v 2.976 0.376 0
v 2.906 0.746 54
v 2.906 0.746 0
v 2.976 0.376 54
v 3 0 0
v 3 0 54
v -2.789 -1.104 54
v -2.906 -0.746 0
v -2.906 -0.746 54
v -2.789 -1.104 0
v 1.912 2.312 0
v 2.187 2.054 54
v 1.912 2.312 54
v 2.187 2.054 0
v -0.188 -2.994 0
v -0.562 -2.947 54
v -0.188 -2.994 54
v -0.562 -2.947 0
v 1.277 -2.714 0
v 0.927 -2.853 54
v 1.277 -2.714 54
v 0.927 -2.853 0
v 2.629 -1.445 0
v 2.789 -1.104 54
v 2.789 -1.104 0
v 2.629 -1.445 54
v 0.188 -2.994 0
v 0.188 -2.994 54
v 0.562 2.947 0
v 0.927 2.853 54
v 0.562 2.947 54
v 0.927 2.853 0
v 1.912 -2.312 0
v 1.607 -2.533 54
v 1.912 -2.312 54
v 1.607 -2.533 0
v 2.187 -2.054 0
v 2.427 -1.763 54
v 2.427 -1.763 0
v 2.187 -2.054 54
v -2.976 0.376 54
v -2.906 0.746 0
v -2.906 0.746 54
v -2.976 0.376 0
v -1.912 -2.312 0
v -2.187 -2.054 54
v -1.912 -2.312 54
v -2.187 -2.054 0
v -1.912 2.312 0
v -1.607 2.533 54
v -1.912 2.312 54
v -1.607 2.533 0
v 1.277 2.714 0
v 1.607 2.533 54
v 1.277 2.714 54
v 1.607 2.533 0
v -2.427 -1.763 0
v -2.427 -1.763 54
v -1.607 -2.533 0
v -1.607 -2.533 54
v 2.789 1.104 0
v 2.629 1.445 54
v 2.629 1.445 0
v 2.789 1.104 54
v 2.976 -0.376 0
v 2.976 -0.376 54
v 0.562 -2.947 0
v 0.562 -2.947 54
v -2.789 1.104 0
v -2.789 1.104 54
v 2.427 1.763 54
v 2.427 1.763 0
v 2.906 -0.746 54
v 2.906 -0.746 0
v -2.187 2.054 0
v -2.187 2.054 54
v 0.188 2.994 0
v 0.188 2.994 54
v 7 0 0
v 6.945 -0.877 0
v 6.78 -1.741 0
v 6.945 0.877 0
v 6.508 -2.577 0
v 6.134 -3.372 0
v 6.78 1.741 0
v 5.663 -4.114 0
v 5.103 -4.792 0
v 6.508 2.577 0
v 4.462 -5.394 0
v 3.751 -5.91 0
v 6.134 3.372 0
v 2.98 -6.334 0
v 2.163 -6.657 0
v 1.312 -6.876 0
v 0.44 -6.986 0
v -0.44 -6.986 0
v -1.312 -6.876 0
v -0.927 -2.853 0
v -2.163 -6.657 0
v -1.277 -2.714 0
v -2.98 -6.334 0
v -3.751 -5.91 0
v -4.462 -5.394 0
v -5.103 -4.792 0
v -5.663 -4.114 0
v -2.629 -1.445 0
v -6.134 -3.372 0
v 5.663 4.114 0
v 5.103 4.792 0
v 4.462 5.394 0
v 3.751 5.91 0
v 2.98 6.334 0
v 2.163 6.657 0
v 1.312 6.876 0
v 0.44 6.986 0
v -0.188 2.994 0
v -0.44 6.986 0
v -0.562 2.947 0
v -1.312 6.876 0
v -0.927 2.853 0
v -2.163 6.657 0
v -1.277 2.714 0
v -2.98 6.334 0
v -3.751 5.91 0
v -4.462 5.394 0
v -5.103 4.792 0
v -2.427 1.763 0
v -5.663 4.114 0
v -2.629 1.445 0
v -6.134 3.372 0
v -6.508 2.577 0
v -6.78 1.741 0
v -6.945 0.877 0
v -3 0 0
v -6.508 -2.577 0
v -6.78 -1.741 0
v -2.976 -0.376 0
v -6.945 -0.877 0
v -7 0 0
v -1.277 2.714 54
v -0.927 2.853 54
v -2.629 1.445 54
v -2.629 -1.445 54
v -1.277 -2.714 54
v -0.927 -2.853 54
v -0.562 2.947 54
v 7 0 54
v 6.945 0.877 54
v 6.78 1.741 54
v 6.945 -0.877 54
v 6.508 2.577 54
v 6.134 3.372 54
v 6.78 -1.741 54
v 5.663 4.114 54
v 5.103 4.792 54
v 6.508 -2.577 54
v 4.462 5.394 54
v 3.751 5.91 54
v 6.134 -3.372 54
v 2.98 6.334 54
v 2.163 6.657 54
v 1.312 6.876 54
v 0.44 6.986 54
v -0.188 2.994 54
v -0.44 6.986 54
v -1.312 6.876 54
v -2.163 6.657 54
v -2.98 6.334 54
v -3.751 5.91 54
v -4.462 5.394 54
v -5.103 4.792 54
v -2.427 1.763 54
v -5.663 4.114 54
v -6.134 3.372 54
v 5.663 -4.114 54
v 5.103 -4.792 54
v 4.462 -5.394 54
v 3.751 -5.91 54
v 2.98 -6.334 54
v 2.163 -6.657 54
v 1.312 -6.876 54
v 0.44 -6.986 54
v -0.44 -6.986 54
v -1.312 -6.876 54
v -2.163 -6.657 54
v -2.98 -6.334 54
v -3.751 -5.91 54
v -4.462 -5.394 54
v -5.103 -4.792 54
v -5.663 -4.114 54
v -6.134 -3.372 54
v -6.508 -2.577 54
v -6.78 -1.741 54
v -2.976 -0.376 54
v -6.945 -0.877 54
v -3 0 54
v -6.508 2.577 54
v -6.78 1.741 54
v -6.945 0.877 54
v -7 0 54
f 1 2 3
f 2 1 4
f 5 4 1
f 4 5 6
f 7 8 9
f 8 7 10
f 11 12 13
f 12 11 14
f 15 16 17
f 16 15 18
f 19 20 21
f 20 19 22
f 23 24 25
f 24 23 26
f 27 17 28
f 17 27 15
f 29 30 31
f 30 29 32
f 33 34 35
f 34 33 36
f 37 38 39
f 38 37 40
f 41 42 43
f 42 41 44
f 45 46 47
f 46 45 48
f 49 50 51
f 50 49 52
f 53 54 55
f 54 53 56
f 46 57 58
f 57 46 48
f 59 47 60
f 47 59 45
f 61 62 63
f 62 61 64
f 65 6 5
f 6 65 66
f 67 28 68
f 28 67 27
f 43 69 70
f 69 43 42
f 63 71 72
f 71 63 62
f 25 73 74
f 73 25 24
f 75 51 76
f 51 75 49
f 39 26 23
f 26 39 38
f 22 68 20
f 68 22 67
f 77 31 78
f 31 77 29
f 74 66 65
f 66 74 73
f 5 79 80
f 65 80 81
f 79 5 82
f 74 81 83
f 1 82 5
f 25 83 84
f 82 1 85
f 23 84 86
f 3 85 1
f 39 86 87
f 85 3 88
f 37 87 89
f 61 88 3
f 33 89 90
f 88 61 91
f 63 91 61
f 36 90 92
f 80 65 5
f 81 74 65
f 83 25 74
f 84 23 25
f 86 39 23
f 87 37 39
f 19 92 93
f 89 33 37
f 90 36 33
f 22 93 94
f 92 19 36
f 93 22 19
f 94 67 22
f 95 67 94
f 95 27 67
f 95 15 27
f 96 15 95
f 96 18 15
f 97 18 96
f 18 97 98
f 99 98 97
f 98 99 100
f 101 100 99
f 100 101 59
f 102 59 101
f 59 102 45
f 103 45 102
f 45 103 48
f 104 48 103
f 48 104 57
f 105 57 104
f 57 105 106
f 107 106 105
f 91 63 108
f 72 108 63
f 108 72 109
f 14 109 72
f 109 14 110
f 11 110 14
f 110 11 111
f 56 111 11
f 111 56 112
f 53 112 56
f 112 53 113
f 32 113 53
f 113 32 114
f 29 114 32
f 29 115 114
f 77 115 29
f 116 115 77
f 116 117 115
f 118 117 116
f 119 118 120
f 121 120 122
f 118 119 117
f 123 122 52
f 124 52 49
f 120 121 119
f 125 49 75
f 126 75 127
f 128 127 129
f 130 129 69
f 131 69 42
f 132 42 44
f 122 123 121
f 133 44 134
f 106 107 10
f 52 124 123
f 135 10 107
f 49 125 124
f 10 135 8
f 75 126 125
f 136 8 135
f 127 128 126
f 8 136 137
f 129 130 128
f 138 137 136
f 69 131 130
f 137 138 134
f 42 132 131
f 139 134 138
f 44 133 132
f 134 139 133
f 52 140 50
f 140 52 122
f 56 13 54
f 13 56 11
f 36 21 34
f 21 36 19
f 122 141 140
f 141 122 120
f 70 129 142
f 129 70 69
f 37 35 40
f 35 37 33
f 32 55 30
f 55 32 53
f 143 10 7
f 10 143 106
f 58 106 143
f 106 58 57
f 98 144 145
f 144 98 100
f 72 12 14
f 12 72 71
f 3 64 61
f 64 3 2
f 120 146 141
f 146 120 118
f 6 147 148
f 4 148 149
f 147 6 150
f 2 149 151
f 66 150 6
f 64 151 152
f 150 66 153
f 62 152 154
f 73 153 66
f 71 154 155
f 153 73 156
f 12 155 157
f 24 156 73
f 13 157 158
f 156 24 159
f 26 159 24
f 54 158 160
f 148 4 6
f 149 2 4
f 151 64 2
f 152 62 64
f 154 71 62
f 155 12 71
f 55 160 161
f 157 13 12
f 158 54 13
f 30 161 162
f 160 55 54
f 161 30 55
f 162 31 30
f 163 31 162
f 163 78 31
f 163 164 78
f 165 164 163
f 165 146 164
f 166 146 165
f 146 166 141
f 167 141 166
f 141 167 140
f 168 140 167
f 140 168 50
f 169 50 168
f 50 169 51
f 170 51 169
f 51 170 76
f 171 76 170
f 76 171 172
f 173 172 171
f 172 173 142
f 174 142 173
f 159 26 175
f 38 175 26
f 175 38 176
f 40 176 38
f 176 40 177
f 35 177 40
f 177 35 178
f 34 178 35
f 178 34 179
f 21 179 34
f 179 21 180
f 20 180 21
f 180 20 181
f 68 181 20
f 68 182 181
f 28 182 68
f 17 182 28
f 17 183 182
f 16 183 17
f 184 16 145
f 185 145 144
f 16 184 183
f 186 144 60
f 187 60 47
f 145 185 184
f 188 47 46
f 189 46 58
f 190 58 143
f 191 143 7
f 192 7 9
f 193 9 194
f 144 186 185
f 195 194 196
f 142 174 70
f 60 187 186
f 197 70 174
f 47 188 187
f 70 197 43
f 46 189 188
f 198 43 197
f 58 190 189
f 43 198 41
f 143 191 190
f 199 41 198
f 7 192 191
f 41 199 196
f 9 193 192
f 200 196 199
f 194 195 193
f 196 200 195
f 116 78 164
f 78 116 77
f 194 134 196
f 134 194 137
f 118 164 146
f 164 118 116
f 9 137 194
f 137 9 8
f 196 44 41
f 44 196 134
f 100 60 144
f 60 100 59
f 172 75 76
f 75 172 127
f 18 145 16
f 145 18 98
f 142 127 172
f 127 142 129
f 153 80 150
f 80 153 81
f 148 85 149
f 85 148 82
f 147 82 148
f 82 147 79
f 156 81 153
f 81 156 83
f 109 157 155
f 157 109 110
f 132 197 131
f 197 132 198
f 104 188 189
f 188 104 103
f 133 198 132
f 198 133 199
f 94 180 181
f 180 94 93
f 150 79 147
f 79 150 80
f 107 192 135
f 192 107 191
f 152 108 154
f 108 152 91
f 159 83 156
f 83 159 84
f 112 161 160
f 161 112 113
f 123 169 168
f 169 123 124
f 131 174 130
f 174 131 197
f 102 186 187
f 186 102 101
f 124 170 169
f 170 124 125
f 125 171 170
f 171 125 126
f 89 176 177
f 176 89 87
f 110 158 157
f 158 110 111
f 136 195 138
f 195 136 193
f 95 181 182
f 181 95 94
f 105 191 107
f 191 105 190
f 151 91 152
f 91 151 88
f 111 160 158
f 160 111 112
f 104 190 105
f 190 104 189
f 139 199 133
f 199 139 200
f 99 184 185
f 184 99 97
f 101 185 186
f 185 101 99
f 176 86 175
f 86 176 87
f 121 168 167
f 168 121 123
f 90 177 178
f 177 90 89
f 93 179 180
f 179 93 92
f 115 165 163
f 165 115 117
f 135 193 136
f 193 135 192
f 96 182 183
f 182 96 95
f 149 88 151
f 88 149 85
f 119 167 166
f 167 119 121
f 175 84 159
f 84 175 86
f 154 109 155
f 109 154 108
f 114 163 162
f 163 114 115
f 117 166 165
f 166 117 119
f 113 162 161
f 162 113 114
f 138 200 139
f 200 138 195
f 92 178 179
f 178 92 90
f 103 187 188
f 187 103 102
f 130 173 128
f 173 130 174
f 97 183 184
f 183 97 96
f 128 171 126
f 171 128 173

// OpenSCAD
$fn = 50;


difference() {
	union() {
		cylinder(h = 54, r = 7.0000000000);
	}
	union() {
		cylinder(h = 54, r = 3.0000000000);
		cylinder(h = 54, r = 3.0000000000);
		cylinder(h = 54, r = 1.5000000000);
		cylinder(h = 54, r = 1.5000000000);
		cylinder(h = 54, r = 1.5000000000);
		cylinder(h = 54, r = 1.5000000000);
		cylinder(h = 54, r = 1.5000000000);
		cylinder(h = 54, r = 1.5000000000);
	}
}
